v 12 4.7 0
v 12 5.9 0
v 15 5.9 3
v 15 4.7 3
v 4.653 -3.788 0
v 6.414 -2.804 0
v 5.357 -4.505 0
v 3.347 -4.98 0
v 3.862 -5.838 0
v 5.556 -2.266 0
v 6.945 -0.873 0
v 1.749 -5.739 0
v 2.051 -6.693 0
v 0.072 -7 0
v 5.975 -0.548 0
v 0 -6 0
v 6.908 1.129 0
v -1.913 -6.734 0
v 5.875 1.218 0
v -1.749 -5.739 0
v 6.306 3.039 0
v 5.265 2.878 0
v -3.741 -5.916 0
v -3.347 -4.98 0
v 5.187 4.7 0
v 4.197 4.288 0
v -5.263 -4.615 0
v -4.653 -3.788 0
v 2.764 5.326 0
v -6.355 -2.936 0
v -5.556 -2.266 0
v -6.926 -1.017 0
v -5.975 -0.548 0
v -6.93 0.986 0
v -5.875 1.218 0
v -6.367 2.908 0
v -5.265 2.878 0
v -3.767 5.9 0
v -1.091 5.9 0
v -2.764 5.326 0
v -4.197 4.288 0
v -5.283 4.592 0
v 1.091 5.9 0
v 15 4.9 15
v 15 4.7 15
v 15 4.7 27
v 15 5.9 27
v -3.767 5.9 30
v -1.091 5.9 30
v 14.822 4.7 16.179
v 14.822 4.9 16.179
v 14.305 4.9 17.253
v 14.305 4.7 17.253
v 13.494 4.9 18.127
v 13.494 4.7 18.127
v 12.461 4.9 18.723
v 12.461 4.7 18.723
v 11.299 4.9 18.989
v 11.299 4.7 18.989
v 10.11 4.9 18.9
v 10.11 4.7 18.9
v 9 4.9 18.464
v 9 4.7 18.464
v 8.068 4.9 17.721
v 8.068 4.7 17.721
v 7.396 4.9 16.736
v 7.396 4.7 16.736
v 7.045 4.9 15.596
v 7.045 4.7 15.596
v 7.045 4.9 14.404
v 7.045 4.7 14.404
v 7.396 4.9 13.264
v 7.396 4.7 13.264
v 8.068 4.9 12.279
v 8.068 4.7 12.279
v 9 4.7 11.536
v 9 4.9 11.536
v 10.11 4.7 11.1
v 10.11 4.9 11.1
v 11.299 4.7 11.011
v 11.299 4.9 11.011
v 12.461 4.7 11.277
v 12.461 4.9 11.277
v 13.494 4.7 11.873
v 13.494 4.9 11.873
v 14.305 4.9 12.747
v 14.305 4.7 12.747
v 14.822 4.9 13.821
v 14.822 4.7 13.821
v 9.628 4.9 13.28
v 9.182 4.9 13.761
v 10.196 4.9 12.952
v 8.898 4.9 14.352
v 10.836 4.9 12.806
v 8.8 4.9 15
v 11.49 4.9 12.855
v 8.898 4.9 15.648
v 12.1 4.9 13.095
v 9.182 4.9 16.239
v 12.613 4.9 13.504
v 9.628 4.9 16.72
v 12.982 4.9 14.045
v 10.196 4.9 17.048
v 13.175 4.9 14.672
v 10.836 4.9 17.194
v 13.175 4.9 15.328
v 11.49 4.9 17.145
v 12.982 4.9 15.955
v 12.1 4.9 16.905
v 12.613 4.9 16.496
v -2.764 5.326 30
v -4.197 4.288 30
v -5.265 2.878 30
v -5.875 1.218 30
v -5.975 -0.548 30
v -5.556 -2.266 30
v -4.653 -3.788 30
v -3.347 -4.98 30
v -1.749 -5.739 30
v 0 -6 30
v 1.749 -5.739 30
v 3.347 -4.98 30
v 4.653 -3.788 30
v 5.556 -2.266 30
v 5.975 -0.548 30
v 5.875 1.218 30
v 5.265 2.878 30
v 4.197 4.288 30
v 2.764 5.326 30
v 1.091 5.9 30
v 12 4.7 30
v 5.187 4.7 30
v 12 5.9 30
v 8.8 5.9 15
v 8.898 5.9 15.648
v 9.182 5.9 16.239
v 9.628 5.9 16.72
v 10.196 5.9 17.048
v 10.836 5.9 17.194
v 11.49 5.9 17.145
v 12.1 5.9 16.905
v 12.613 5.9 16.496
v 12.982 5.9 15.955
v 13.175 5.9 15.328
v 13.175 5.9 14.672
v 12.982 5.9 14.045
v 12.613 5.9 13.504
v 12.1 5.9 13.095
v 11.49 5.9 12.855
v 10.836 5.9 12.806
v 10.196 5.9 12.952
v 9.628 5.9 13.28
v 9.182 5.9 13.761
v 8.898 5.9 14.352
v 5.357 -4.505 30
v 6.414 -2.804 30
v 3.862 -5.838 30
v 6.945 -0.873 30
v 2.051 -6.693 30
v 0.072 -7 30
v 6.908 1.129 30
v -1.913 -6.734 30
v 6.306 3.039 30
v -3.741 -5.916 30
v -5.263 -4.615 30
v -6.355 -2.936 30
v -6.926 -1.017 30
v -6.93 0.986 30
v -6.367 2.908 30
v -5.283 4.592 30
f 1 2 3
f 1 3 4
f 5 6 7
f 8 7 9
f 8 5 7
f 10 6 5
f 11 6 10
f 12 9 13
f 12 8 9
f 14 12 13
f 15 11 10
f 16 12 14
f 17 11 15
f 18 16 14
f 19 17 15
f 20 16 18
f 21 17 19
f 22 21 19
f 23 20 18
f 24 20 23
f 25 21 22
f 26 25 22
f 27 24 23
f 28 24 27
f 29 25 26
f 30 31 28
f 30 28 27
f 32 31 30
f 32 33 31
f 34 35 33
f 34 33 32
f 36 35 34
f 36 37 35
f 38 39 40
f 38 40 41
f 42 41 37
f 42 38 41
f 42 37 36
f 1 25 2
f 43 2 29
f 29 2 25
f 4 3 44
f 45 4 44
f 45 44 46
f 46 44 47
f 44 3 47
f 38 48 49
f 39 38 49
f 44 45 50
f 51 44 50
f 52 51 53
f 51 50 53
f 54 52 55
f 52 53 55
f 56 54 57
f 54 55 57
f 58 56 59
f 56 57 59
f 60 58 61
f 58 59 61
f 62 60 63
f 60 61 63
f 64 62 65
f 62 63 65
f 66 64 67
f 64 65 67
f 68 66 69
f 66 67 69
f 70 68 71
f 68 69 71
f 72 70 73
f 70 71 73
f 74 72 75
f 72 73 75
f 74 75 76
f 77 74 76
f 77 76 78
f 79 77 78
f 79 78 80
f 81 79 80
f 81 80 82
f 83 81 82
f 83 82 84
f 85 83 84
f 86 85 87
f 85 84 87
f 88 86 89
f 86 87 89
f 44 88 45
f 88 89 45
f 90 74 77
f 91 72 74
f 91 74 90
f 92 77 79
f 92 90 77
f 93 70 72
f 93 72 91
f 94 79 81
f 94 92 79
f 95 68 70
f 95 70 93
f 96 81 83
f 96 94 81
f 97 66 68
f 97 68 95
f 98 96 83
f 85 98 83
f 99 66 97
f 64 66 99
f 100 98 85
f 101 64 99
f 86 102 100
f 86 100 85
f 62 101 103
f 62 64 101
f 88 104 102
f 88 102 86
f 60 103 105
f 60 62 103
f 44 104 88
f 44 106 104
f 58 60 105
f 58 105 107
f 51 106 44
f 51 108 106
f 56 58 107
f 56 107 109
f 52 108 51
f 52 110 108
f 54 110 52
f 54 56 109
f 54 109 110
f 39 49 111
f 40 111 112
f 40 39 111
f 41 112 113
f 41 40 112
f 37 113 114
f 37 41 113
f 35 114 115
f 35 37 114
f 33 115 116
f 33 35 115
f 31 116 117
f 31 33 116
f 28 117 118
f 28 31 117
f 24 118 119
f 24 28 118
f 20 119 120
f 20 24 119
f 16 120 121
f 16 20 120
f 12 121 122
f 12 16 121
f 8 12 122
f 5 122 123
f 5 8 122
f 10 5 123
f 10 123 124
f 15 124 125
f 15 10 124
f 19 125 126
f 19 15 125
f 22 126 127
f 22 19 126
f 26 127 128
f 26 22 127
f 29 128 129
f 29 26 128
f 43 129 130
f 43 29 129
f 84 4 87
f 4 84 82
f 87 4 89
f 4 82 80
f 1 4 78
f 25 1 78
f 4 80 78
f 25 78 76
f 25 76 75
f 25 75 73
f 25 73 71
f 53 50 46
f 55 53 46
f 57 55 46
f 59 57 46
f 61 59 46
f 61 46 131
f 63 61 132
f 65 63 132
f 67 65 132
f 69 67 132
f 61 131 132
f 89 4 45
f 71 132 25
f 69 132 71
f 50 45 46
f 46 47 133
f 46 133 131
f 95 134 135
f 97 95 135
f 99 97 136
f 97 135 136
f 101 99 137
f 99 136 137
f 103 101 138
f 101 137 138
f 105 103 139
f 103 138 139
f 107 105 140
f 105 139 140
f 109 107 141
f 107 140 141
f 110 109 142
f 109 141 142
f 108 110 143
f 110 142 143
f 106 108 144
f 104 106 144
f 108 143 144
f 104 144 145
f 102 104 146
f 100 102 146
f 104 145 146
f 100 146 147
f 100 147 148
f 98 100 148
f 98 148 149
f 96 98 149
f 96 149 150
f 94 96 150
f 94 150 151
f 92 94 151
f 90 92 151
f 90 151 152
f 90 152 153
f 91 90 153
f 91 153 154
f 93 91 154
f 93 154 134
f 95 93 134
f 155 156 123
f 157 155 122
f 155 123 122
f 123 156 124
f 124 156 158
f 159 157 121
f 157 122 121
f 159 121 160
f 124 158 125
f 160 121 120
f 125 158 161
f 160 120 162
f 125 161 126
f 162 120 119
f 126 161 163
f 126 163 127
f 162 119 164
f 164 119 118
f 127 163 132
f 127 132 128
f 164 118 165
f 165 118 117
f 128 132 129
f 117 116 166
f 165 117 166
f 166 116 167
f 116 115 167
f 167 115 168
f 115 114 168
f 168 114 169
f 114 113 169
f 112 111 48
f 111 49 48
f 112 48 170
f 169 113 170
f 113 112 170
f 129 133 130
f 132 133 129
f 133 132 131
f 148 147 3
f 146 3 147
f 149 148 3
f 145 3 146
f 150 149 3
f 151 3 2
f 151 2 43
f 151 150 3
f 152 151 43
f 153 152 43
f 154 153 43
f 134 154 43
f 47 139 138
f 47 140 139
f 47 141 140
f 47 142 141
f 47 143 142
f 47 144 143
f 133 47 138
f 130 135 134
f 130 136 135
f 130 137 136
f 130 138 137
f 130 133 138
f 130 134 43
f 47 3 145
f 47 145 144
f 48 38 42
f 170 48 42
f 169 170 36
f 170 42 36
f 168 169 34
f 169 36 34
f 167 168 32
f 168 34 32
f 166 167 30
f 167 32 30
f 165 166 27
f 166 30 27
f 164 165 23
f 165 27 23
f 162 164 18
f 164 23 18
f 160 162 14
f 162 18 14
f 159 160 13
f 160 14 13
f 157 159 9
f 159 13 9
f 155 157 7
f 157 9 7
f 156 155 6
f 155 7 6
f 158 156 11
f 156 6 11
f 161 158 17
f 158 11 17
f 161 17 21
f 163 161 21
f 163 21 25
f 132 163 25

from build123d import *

# Parameters (mm, degrees)
SKETCH_R        = 7
SKETCH_R_2      = 6
PAD_DEPTH       = 30
SKETCH001_W     = 21.169265
SKETCH001_H     = 5.002638
POCKET_DEPTH    = 30.001
SKETCH002_W     = 11.233038
SKETCH002_H     = 30
SKETCH002_R     = 2.2
PAD001_DEPTH    = 1.2
SKETCH003_R     = 4
POCKET001_DEPTH = 0.2
CHAMFER_SIZE    = 3


with BuildPart() as part:
    # Sketch → Pad (new body)
    with BuildSketch(Plane.XY):
        Circle(SKETCH_R)
        Circle(SKETCH_R_2, mode=Mode.SUBTRACT)
    extrude(amount=PAD_DEPTH)

    # Sketch001 → Pocket (cut, through all)
    with BuildSketch(Plane.XY.offset(30)):
        with Locations((-0.201503, 8.401319)):
            Rectangle(SKETCH001_W, SKETCH001_H)
    extrude(amount=-POCKET_DEPTH, mode=Mode.SUBTRACT)

    # Sketch002 → Pad001 (new body)
    with BuildSketch(Plane(origin=(0, 5.9, 0), x_dir=(-1, 0, 0), z_dir=(0, 1, 0))):
        with Locations((-9.383481, 15)):
            Rectangle(SKETCH002_W, SKETCH002_H)
        with Locations((-11, 15)):
            Circle(SKETCH002_R, mode=Mode.SUBTRACT)
    extrude(amount=-PAD001_DEPTH)

    # Sketch003 → Pocket001 (cut)
    with BuildSketch(Plane.XZ.offset(-4.7)):
        with Locations((11, 15)):
            Circle(SKETCH003_R)
    extrude(amount=-POCKET001_DEPTH, mode=Mode.SUBTRACT)

    # Chamfer
    chamfer_edges = [part.edges().sort_by_distance(p)[0] for p in [
        (15, 5.3, 0),
        (15, 5.3, 30),
    ]]
    chamfer(chamfer_edges, length=CHAMFER_SIZE)


solid = part.part
